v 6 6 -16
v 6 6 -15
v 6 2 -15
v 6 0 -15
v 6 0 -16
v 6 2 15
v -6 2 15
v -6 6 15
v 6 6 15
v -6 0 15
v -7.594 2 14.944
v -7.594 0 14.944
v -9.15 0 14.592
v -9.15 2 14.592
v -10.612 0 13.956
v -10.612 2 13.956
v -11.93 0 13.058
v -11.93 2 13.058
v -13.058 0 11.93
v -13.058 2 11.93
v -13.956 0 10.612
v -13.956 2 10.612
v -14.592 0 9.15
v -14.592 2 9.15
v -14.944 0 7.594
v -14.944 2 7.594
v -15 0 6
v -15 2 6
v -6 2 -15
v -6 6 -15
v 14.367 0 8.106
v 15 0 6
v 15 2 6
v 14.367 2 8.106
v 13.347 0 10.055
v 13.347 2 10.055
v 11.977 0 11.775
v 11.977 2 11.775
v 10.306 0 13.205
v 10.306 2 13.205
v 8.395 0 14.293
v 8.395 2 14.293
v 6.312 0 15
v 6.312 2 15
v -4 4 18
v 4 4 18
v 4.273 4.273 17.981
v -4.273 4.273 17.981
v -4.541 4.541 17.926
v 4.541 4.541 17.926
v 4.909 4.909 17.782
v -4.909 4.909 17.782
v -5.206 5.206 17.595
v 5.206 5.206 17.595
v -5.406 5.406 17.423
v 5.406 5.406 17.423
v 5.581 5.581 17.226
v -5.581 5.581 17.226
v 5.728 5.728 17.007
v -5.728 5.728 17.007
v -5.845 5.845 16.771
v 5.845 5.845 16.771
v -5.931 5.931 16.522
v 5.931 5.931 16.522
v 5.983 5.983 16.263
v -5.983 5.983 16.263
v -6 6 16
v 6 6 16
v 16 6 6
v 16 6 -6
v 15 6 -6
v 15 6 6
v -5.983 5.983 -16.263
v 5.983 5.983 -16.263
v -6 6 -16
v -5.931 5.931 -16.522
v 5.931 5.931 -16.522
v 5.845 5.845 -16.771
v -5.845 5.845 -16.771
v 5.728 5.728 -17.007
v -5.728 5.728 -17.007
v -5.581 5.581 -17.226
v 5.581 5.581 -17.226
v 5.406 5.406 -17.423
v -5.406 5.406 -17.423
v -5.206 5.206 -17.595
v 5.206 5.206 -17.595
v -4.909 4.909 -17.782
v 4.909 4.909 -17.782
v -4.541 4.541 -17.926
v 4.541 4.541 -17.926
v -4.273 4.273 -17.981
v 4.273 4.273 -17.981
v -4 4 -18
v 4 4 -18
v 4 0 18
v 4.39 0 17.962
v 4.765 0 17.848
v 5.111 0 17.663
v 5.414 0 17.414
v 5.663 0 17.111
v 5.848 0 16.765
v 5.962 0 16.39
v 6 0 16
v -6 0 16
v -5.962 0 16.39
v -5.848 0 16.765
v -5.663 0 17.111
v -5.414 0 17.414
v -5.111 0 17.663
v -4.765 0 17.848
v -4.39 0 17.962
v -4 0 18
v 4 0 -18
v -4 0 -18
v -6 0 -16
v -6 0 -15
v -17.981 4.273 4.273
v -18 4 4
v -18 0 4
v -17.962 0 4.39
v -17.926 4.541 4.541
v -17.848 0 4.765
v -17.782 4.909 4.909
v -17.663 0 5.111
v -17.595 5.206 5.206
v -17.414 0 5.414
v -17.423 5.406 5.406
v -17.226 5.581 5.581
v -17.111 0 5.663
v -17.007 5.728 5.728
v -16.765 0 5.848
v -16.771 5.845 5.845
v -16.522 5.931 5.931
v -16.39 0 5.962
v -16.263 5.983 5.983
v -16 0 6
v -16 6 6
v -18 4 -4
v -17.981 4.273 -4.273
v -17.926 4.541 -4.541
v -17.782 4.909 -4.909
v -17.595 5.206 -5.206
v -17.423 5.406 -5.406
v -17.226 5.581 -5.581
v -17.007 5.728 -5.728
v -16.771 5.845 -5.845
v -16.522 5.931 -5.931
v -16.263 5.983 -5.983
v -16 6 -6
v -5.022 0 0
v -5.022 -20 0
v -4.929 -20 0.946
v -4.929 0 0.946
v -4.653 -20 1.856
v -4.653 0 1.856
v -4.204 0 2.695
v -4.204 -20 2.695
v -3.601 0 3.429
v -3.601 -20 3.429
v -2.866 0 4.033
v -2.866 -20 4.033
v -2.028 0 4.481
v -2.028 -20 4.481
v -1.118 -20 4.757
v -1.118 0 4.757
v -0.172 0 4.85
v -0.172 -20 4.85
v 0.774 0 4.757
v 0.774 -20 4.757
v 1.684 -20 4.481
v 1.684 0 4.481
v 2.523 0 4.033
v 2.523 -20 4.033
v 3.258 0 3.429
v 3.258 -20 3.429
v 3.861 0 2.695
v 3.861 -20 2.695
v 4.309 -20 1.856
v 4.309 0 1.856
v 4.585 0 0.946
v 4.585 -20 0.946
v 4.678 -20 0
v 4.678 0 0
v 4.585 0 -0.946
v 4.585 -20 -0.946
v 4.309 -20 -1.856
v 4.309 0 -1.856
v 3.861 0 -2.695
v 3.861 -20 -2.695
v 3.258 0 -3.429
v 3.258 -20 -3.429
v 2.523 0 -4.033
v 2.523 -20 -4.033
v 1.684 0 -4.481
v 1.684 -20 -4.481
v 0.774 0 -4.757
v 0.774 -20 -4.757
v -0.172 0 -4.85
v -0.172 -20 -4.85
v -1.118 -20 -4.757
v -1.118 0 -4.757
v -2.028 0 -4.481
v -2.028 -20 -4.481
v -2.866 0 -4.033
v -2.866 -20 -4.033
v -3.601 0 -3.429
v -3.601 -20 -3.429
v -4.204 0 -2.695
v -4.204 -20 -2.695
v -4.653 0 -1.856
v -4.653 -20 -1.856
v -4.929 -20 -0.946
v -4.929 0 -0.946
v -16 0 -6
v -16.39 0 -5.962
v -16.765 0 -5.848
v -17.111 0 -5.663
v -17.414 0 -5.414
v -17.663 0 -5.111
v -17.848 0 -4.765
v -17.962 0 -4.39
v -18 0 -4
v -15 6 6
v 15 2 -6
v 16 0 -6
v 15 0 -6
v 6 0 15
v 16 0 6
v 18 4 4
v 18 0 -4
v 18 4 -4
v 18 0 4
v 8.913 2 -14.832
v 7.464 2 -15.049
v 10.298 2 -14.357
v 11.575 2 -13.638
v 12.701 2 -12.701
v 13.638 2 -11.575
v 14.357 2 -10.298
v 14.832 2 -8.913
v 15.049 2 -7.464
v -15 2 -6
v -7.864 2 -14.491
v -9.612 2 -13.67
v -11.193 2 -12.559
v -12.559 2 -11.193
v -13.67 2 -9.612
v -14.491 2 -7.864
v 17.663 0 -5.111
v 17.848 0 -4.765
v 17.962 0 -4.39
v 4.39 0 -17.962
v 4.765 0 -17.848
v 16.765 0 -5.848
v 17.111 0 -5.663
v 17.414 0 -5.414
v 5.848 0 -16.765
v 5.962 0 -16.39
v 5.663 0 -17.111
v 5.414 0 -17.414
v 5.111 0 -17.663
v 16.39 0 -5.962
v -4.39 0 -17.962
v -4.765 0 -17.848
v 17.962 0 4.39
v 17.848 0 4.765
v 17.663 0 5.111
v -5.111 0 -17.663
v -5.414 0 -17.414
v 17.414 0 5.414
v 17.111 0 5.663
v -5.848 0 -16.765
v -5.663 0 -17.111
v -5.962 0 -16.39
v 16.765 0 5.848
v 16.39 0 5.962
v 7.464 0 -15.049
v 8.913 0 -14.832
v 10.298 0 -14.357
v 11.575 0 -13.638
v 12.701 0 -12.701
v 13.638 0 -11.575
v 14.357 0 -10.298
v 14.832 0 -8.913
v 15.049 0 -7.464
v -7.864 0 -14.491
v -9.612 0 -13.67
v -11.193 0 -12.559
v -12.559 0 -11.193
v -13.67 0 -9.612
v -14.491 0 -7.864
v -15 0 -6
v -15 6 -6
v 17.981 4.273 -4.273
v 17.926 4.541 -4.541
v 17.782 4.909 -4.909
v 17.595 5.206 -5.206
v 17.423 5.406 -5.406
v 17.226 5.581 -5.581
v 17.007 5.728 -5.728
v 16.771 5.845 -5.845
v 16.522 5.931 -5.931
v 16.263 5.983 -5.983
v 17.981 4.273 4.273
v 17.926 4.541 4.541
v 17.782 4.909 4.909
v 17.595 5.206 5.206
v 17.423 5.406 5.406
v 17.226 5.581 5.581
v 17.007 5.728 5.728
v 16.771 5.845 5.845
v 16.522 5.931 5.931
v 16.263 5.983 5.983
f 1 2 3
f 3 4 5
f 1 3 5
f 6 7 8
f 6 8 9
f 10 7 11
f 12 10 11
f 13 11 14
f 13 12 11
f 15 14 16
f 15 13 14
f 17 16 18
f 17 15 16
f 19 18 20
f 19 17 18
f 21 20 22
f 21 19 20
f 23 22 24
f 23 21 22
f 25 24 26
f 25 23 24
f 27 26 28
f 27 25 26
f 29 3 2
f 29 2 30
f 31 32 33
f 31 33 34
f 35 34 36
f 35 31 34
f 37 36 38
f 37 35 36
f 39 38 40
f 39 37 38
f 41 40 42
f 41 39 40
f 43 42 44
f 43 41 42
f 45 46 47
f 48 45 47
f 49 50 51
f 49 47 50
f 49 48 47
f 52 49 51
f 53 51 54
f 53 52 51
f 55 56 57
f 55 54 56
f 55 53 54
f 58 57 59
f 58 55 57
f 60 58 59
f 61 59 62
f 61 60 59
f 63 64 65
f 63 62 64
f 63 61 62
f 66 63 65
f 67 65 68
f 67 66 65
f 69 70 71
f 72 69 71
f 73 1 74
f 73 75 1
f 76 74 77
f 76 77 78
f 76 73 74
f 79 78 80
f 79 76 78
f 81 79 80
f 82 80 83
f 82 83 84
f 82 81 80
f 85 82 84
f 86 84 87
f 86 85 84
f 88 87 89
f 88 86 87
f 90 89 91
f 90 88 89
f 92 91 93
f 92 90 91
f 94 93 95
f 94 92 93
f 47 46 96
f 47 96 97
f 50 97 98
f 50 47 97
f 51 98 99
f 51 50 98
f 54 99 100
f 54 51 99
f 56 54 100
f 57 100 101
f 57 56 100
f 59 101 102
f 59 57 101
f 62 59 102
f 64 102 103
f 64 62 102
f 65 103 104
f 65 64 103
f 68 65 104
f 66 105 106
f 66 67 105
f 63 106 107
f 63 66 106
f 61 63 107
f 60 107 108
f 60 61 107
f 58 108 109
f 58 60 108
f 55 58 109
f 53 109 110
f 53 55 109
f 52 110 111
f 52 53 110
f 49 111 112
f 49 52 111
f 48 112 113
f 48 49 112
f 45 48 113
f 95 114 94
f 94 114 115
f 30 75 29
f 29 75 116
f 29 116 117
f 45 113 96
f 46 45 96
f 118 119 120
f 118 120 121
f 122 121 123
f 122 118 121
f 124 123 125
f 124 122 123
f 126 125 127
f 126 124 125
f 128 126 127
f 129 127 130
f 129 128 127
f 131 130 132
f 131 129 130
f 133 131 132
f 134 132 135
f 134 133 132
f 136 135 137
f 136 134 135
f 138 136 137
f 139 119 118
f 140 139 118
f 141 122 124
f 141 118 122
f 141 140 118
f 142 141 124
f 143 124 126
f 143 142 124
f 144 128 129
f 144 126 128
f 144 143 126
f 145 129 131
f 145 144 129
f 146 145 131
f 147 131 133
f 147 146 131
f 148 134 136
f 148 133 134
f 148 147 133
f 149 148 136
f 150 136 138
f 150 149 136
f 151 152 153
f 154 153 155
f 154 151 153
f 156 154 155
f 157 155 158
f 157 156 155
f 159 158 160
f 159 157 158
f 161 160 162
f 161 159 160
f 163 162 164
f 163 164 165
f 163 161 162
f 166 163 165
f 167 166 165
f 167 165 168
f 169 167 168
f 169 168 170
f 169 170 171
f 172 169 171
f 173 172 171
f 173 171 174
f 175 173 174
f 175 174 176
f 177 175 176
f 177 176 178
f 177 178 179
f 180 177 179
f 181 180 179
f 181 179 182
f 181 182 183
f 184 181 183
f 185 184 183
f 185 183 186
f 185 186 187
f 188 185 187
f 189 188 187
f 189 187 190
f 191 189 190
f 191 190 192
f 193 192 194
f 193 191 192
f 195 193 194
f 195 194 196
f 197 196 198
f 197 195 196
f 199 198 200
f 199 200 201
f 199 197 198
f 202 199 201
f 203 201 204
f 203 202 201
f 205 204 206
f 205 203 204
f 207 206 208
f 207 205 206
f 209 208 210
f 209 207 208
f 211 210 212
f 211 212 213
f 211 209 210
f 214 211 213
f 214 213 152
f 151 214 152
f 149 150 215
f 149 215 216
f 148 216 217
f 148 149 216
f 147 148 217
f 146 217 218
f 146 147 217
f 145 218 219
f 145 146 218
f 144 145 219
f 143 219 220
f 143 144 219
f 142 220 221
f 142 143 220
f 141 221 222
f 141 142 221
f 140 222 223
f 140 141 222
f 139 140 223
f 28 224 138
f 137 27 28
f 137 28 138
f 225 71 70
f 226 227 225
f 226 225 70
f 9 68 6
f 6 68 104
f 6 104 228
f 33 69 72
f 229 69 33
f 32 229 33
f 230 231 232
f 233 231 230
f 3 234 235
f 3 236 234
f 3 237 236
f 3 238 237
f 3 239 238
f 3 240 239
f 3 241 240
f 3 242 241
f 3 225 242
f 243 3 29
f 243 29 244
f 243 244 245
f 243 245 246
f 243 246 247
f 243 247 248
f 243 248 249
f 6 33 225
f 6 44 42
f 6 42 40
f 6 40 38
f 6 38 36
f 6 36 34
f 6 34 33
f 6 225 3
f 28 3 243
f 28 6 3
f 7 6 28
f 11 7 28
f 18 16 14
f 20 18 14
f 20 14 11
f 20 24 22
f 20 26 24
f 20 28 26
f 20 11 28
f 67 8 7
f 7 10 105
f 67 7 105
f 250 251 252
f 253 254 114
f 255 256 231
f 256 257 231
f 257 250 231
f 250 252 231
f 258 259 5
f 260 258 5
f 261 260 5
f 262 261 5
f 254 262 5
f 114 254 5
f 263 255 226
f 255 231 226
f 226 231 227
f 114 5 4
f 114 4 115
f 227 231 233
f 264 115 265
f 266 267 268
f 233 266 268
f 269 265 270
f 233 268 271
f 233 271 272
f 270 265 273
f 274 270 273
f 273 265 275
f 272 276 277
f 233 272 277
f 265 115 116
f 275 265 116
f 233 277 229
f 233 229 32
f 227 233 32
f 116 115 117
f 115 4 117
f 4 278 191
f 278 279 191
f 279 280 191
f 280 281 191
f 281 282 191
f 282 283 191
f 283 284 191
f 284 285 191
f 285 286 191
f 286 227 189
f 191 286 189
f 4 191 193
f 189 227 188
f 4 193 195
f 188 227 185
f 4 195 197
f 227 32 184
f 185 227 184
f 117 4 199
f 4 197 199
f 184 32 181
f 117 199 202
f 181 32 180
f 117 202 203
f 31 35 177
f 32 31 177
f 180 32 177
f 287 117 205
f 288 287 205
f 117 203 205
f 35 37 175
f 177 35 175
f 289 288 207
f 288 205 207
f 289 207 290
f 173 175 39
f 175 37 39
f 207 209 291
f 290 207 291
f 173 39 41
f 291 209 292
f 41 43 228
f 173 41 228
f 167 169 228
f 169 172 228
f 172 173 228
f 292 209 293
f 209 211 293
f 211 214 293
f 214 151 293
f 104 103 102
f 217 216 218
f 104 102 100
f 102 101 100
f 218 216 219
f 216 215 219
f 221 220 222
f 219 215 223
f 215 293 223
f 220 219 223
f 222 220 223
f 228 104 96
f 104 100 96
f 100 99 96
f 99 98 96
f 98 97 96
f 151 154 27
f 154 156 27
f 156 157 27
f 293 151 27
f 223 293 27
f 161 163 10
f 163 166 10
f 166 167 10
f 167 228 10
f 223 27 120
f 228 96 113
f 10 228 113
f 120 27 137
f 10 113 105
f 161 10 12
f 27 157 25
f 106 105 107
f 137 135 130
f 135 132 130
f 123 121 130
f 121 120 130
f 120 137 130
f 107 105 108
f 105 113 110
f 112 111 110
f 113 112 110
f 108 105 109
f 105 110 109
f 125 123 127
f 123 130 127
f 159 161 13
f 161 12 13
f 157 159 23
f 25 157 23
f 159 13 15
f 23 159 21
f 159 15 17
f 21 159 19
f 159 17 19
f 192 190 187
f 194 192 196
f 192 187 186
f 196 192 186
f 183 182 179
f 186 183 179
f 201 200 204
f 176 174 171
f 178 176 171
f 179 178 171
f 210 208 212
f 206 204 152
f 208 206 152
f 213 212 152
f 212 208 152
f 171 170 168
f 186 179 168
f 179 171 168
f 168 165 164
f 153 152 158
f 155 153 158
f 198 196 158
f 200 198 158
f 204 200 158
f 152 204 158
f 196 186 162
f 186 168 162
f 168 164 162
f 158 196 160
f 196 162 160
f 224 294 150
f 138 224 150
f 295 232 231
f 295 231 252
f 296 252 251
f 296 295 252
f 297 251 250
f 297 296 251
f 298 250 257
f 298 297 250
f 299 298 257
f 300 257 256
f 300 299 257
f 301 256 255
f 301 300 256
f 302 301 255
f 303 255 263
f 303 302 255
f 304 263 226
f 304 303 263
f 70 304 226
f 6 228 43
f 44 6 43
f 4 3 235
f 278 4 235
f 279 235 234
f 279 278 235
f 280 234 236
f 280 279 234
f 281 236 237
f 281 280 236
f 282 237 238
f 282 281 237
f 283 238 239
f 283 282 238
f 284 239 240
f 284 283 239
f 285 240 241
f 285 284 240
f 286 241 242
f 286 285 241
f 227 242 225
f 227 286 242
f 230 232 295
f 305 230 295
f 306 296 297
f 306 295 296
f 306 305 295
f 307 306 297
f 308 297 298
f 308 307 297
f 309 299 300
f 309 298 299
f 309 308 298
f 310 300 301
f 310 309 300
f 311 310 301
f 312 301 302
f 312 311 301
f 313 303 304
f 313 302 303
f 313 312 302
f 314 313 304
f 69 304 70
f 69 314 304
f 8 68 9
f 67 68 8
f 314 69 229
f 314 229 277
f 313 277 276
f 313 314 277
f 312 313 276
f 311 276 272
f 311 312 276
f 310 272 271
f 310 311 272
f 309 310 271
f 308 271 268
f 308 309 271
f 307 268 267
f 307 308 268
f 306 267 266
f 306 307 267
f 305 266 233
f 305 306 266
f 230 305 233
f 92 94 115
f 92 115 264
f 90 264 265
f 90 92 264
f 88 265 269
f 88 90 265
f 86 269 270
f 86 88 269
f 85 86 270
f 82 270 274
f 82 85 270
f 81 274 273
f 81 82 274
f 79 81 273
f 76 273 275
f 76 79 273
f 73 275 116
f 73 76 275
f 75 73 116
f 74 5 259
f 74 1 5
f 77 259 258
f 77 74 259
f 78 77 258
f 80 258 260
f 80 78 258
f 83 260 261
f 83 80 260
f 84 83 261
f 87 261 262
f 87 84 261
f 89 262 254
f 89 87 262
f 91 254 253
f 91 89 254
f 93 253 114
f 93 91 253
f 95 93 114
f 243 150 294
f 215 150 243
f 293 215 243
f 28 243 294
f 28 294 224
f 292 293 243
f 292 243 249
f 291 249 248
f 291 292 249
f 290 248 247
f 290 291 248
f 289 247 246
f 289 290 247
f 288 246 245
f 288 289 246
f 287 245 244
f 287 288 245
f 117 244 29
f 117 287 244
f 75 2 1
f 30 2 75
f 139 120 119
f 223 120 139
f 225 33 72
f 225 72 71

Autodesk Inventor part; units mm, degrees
ref_plane "YZ Plane" through (0, 0, 0) normal (1, 0, 0) x (0, 1, 0)
ref_plane "XZ Plane" through (0, 0, 0) normal (0, 1, 0) x (-1, 0, 0)
ref_plane "XY Plane" through (0, 0, 0) normal (0, 0, 1) x (1, 0, 0)
sketch "Sketch1" plane through (0, 0, 0) normal (0, 1, 0) x (-1, 0, 0)
  circle A0 centre (0.1717, 0) radius 4.85
  line L0 (15, 15) -> (-15, 15)
  line L1 (-15, 15) -> (-15, -15)
  line L2 (-15, -15) -> (15, -15)
  line L3 (15, -15) -> (15, 15)
  line L4 (0, 15) -> (6, 15)
  line L5 (6, 15) -> (6, 18)
  line L6 (6, 18) -> (0, 18)
  line L7 (0, 18) -> (-6, 18)
  line L8 (-6, 18) -> (-6, 15)
  line L9 (-6, 15) -> (0, 15)
  line L10 (6, -15) -> (-6, -15)
  line L11 (-6, -15) -> (-6, -18)
  line L12 (-6, -18) -> (6, -18)
  line L13 (6, -18) -> (6, -15)
  line L14 (15, 6) -> (18, 6)
  line L15 (18, 6) -> (18, -6)
  line L16 (18, -6) -> (15, -6)
  line L17 (15, -6) -> (15, 6)
  line L18 (-15, -6) -> (-18, -6)
  line L19 (-18, -6) -> (-18, 6)
  line L20 (-18, 6) -> (-15, 6)
  line L21 (-15, 6) -> (-15, -6)
  arc A1 (15, 6) -> (6, 15) centre (6.5, 6.5) ccw
  arc A2 (6, -15) -> (15, -6) centre (4, -4) ccw
  arc A3 (-15, -6) -> (-6, -15) centre (-7, -7) ccw
  arc A4 (-6.3124, 15) -> (-15, 6) centre (-3.6523, 3.7392) ccw
  point P0 (0, 0)
  dimension "d0" = 9.7
extrude "Extrusion1" add sketch "Sketch1" along normal blind 6 contours L0 L8 L7 L6 L5 | L14 L15 L16 L3 | L1 L18 L19 L20 | L13 L12 L11 L2
extrude "Extrusion2" cut sketch "Sketch1" along normal blind 3 contours L0 A1 L3 A2 L2 A3 L1 A4 | A1 L0 | A1 L3 | L1 A3 | A3 L2
extrude "Extrusion3" add sketch "Sketch1" along normal blind 2 contours A0 | L0 A1 L3 A2 L2 A3 L1 A4 | A1 L0 | A1 L3 | L1 A3 | A3 L2
fillet "Fillet1" radius 2 12 edges at (18, 3, -6) (6, 3, -18) (-6, 3, -18) (-18, 3, -6) (-18, 3, 6) (-6, 3, 18) (6, 3, 18) (18, 3, 6) (0, 6, 18) (-18, 6, 0) (0, 6, -18) (18, 6, 0)
extrude "Extrusion4" add sketch "Sketch1" against normal blind 20 contours A0
properties part number "spider_support"
